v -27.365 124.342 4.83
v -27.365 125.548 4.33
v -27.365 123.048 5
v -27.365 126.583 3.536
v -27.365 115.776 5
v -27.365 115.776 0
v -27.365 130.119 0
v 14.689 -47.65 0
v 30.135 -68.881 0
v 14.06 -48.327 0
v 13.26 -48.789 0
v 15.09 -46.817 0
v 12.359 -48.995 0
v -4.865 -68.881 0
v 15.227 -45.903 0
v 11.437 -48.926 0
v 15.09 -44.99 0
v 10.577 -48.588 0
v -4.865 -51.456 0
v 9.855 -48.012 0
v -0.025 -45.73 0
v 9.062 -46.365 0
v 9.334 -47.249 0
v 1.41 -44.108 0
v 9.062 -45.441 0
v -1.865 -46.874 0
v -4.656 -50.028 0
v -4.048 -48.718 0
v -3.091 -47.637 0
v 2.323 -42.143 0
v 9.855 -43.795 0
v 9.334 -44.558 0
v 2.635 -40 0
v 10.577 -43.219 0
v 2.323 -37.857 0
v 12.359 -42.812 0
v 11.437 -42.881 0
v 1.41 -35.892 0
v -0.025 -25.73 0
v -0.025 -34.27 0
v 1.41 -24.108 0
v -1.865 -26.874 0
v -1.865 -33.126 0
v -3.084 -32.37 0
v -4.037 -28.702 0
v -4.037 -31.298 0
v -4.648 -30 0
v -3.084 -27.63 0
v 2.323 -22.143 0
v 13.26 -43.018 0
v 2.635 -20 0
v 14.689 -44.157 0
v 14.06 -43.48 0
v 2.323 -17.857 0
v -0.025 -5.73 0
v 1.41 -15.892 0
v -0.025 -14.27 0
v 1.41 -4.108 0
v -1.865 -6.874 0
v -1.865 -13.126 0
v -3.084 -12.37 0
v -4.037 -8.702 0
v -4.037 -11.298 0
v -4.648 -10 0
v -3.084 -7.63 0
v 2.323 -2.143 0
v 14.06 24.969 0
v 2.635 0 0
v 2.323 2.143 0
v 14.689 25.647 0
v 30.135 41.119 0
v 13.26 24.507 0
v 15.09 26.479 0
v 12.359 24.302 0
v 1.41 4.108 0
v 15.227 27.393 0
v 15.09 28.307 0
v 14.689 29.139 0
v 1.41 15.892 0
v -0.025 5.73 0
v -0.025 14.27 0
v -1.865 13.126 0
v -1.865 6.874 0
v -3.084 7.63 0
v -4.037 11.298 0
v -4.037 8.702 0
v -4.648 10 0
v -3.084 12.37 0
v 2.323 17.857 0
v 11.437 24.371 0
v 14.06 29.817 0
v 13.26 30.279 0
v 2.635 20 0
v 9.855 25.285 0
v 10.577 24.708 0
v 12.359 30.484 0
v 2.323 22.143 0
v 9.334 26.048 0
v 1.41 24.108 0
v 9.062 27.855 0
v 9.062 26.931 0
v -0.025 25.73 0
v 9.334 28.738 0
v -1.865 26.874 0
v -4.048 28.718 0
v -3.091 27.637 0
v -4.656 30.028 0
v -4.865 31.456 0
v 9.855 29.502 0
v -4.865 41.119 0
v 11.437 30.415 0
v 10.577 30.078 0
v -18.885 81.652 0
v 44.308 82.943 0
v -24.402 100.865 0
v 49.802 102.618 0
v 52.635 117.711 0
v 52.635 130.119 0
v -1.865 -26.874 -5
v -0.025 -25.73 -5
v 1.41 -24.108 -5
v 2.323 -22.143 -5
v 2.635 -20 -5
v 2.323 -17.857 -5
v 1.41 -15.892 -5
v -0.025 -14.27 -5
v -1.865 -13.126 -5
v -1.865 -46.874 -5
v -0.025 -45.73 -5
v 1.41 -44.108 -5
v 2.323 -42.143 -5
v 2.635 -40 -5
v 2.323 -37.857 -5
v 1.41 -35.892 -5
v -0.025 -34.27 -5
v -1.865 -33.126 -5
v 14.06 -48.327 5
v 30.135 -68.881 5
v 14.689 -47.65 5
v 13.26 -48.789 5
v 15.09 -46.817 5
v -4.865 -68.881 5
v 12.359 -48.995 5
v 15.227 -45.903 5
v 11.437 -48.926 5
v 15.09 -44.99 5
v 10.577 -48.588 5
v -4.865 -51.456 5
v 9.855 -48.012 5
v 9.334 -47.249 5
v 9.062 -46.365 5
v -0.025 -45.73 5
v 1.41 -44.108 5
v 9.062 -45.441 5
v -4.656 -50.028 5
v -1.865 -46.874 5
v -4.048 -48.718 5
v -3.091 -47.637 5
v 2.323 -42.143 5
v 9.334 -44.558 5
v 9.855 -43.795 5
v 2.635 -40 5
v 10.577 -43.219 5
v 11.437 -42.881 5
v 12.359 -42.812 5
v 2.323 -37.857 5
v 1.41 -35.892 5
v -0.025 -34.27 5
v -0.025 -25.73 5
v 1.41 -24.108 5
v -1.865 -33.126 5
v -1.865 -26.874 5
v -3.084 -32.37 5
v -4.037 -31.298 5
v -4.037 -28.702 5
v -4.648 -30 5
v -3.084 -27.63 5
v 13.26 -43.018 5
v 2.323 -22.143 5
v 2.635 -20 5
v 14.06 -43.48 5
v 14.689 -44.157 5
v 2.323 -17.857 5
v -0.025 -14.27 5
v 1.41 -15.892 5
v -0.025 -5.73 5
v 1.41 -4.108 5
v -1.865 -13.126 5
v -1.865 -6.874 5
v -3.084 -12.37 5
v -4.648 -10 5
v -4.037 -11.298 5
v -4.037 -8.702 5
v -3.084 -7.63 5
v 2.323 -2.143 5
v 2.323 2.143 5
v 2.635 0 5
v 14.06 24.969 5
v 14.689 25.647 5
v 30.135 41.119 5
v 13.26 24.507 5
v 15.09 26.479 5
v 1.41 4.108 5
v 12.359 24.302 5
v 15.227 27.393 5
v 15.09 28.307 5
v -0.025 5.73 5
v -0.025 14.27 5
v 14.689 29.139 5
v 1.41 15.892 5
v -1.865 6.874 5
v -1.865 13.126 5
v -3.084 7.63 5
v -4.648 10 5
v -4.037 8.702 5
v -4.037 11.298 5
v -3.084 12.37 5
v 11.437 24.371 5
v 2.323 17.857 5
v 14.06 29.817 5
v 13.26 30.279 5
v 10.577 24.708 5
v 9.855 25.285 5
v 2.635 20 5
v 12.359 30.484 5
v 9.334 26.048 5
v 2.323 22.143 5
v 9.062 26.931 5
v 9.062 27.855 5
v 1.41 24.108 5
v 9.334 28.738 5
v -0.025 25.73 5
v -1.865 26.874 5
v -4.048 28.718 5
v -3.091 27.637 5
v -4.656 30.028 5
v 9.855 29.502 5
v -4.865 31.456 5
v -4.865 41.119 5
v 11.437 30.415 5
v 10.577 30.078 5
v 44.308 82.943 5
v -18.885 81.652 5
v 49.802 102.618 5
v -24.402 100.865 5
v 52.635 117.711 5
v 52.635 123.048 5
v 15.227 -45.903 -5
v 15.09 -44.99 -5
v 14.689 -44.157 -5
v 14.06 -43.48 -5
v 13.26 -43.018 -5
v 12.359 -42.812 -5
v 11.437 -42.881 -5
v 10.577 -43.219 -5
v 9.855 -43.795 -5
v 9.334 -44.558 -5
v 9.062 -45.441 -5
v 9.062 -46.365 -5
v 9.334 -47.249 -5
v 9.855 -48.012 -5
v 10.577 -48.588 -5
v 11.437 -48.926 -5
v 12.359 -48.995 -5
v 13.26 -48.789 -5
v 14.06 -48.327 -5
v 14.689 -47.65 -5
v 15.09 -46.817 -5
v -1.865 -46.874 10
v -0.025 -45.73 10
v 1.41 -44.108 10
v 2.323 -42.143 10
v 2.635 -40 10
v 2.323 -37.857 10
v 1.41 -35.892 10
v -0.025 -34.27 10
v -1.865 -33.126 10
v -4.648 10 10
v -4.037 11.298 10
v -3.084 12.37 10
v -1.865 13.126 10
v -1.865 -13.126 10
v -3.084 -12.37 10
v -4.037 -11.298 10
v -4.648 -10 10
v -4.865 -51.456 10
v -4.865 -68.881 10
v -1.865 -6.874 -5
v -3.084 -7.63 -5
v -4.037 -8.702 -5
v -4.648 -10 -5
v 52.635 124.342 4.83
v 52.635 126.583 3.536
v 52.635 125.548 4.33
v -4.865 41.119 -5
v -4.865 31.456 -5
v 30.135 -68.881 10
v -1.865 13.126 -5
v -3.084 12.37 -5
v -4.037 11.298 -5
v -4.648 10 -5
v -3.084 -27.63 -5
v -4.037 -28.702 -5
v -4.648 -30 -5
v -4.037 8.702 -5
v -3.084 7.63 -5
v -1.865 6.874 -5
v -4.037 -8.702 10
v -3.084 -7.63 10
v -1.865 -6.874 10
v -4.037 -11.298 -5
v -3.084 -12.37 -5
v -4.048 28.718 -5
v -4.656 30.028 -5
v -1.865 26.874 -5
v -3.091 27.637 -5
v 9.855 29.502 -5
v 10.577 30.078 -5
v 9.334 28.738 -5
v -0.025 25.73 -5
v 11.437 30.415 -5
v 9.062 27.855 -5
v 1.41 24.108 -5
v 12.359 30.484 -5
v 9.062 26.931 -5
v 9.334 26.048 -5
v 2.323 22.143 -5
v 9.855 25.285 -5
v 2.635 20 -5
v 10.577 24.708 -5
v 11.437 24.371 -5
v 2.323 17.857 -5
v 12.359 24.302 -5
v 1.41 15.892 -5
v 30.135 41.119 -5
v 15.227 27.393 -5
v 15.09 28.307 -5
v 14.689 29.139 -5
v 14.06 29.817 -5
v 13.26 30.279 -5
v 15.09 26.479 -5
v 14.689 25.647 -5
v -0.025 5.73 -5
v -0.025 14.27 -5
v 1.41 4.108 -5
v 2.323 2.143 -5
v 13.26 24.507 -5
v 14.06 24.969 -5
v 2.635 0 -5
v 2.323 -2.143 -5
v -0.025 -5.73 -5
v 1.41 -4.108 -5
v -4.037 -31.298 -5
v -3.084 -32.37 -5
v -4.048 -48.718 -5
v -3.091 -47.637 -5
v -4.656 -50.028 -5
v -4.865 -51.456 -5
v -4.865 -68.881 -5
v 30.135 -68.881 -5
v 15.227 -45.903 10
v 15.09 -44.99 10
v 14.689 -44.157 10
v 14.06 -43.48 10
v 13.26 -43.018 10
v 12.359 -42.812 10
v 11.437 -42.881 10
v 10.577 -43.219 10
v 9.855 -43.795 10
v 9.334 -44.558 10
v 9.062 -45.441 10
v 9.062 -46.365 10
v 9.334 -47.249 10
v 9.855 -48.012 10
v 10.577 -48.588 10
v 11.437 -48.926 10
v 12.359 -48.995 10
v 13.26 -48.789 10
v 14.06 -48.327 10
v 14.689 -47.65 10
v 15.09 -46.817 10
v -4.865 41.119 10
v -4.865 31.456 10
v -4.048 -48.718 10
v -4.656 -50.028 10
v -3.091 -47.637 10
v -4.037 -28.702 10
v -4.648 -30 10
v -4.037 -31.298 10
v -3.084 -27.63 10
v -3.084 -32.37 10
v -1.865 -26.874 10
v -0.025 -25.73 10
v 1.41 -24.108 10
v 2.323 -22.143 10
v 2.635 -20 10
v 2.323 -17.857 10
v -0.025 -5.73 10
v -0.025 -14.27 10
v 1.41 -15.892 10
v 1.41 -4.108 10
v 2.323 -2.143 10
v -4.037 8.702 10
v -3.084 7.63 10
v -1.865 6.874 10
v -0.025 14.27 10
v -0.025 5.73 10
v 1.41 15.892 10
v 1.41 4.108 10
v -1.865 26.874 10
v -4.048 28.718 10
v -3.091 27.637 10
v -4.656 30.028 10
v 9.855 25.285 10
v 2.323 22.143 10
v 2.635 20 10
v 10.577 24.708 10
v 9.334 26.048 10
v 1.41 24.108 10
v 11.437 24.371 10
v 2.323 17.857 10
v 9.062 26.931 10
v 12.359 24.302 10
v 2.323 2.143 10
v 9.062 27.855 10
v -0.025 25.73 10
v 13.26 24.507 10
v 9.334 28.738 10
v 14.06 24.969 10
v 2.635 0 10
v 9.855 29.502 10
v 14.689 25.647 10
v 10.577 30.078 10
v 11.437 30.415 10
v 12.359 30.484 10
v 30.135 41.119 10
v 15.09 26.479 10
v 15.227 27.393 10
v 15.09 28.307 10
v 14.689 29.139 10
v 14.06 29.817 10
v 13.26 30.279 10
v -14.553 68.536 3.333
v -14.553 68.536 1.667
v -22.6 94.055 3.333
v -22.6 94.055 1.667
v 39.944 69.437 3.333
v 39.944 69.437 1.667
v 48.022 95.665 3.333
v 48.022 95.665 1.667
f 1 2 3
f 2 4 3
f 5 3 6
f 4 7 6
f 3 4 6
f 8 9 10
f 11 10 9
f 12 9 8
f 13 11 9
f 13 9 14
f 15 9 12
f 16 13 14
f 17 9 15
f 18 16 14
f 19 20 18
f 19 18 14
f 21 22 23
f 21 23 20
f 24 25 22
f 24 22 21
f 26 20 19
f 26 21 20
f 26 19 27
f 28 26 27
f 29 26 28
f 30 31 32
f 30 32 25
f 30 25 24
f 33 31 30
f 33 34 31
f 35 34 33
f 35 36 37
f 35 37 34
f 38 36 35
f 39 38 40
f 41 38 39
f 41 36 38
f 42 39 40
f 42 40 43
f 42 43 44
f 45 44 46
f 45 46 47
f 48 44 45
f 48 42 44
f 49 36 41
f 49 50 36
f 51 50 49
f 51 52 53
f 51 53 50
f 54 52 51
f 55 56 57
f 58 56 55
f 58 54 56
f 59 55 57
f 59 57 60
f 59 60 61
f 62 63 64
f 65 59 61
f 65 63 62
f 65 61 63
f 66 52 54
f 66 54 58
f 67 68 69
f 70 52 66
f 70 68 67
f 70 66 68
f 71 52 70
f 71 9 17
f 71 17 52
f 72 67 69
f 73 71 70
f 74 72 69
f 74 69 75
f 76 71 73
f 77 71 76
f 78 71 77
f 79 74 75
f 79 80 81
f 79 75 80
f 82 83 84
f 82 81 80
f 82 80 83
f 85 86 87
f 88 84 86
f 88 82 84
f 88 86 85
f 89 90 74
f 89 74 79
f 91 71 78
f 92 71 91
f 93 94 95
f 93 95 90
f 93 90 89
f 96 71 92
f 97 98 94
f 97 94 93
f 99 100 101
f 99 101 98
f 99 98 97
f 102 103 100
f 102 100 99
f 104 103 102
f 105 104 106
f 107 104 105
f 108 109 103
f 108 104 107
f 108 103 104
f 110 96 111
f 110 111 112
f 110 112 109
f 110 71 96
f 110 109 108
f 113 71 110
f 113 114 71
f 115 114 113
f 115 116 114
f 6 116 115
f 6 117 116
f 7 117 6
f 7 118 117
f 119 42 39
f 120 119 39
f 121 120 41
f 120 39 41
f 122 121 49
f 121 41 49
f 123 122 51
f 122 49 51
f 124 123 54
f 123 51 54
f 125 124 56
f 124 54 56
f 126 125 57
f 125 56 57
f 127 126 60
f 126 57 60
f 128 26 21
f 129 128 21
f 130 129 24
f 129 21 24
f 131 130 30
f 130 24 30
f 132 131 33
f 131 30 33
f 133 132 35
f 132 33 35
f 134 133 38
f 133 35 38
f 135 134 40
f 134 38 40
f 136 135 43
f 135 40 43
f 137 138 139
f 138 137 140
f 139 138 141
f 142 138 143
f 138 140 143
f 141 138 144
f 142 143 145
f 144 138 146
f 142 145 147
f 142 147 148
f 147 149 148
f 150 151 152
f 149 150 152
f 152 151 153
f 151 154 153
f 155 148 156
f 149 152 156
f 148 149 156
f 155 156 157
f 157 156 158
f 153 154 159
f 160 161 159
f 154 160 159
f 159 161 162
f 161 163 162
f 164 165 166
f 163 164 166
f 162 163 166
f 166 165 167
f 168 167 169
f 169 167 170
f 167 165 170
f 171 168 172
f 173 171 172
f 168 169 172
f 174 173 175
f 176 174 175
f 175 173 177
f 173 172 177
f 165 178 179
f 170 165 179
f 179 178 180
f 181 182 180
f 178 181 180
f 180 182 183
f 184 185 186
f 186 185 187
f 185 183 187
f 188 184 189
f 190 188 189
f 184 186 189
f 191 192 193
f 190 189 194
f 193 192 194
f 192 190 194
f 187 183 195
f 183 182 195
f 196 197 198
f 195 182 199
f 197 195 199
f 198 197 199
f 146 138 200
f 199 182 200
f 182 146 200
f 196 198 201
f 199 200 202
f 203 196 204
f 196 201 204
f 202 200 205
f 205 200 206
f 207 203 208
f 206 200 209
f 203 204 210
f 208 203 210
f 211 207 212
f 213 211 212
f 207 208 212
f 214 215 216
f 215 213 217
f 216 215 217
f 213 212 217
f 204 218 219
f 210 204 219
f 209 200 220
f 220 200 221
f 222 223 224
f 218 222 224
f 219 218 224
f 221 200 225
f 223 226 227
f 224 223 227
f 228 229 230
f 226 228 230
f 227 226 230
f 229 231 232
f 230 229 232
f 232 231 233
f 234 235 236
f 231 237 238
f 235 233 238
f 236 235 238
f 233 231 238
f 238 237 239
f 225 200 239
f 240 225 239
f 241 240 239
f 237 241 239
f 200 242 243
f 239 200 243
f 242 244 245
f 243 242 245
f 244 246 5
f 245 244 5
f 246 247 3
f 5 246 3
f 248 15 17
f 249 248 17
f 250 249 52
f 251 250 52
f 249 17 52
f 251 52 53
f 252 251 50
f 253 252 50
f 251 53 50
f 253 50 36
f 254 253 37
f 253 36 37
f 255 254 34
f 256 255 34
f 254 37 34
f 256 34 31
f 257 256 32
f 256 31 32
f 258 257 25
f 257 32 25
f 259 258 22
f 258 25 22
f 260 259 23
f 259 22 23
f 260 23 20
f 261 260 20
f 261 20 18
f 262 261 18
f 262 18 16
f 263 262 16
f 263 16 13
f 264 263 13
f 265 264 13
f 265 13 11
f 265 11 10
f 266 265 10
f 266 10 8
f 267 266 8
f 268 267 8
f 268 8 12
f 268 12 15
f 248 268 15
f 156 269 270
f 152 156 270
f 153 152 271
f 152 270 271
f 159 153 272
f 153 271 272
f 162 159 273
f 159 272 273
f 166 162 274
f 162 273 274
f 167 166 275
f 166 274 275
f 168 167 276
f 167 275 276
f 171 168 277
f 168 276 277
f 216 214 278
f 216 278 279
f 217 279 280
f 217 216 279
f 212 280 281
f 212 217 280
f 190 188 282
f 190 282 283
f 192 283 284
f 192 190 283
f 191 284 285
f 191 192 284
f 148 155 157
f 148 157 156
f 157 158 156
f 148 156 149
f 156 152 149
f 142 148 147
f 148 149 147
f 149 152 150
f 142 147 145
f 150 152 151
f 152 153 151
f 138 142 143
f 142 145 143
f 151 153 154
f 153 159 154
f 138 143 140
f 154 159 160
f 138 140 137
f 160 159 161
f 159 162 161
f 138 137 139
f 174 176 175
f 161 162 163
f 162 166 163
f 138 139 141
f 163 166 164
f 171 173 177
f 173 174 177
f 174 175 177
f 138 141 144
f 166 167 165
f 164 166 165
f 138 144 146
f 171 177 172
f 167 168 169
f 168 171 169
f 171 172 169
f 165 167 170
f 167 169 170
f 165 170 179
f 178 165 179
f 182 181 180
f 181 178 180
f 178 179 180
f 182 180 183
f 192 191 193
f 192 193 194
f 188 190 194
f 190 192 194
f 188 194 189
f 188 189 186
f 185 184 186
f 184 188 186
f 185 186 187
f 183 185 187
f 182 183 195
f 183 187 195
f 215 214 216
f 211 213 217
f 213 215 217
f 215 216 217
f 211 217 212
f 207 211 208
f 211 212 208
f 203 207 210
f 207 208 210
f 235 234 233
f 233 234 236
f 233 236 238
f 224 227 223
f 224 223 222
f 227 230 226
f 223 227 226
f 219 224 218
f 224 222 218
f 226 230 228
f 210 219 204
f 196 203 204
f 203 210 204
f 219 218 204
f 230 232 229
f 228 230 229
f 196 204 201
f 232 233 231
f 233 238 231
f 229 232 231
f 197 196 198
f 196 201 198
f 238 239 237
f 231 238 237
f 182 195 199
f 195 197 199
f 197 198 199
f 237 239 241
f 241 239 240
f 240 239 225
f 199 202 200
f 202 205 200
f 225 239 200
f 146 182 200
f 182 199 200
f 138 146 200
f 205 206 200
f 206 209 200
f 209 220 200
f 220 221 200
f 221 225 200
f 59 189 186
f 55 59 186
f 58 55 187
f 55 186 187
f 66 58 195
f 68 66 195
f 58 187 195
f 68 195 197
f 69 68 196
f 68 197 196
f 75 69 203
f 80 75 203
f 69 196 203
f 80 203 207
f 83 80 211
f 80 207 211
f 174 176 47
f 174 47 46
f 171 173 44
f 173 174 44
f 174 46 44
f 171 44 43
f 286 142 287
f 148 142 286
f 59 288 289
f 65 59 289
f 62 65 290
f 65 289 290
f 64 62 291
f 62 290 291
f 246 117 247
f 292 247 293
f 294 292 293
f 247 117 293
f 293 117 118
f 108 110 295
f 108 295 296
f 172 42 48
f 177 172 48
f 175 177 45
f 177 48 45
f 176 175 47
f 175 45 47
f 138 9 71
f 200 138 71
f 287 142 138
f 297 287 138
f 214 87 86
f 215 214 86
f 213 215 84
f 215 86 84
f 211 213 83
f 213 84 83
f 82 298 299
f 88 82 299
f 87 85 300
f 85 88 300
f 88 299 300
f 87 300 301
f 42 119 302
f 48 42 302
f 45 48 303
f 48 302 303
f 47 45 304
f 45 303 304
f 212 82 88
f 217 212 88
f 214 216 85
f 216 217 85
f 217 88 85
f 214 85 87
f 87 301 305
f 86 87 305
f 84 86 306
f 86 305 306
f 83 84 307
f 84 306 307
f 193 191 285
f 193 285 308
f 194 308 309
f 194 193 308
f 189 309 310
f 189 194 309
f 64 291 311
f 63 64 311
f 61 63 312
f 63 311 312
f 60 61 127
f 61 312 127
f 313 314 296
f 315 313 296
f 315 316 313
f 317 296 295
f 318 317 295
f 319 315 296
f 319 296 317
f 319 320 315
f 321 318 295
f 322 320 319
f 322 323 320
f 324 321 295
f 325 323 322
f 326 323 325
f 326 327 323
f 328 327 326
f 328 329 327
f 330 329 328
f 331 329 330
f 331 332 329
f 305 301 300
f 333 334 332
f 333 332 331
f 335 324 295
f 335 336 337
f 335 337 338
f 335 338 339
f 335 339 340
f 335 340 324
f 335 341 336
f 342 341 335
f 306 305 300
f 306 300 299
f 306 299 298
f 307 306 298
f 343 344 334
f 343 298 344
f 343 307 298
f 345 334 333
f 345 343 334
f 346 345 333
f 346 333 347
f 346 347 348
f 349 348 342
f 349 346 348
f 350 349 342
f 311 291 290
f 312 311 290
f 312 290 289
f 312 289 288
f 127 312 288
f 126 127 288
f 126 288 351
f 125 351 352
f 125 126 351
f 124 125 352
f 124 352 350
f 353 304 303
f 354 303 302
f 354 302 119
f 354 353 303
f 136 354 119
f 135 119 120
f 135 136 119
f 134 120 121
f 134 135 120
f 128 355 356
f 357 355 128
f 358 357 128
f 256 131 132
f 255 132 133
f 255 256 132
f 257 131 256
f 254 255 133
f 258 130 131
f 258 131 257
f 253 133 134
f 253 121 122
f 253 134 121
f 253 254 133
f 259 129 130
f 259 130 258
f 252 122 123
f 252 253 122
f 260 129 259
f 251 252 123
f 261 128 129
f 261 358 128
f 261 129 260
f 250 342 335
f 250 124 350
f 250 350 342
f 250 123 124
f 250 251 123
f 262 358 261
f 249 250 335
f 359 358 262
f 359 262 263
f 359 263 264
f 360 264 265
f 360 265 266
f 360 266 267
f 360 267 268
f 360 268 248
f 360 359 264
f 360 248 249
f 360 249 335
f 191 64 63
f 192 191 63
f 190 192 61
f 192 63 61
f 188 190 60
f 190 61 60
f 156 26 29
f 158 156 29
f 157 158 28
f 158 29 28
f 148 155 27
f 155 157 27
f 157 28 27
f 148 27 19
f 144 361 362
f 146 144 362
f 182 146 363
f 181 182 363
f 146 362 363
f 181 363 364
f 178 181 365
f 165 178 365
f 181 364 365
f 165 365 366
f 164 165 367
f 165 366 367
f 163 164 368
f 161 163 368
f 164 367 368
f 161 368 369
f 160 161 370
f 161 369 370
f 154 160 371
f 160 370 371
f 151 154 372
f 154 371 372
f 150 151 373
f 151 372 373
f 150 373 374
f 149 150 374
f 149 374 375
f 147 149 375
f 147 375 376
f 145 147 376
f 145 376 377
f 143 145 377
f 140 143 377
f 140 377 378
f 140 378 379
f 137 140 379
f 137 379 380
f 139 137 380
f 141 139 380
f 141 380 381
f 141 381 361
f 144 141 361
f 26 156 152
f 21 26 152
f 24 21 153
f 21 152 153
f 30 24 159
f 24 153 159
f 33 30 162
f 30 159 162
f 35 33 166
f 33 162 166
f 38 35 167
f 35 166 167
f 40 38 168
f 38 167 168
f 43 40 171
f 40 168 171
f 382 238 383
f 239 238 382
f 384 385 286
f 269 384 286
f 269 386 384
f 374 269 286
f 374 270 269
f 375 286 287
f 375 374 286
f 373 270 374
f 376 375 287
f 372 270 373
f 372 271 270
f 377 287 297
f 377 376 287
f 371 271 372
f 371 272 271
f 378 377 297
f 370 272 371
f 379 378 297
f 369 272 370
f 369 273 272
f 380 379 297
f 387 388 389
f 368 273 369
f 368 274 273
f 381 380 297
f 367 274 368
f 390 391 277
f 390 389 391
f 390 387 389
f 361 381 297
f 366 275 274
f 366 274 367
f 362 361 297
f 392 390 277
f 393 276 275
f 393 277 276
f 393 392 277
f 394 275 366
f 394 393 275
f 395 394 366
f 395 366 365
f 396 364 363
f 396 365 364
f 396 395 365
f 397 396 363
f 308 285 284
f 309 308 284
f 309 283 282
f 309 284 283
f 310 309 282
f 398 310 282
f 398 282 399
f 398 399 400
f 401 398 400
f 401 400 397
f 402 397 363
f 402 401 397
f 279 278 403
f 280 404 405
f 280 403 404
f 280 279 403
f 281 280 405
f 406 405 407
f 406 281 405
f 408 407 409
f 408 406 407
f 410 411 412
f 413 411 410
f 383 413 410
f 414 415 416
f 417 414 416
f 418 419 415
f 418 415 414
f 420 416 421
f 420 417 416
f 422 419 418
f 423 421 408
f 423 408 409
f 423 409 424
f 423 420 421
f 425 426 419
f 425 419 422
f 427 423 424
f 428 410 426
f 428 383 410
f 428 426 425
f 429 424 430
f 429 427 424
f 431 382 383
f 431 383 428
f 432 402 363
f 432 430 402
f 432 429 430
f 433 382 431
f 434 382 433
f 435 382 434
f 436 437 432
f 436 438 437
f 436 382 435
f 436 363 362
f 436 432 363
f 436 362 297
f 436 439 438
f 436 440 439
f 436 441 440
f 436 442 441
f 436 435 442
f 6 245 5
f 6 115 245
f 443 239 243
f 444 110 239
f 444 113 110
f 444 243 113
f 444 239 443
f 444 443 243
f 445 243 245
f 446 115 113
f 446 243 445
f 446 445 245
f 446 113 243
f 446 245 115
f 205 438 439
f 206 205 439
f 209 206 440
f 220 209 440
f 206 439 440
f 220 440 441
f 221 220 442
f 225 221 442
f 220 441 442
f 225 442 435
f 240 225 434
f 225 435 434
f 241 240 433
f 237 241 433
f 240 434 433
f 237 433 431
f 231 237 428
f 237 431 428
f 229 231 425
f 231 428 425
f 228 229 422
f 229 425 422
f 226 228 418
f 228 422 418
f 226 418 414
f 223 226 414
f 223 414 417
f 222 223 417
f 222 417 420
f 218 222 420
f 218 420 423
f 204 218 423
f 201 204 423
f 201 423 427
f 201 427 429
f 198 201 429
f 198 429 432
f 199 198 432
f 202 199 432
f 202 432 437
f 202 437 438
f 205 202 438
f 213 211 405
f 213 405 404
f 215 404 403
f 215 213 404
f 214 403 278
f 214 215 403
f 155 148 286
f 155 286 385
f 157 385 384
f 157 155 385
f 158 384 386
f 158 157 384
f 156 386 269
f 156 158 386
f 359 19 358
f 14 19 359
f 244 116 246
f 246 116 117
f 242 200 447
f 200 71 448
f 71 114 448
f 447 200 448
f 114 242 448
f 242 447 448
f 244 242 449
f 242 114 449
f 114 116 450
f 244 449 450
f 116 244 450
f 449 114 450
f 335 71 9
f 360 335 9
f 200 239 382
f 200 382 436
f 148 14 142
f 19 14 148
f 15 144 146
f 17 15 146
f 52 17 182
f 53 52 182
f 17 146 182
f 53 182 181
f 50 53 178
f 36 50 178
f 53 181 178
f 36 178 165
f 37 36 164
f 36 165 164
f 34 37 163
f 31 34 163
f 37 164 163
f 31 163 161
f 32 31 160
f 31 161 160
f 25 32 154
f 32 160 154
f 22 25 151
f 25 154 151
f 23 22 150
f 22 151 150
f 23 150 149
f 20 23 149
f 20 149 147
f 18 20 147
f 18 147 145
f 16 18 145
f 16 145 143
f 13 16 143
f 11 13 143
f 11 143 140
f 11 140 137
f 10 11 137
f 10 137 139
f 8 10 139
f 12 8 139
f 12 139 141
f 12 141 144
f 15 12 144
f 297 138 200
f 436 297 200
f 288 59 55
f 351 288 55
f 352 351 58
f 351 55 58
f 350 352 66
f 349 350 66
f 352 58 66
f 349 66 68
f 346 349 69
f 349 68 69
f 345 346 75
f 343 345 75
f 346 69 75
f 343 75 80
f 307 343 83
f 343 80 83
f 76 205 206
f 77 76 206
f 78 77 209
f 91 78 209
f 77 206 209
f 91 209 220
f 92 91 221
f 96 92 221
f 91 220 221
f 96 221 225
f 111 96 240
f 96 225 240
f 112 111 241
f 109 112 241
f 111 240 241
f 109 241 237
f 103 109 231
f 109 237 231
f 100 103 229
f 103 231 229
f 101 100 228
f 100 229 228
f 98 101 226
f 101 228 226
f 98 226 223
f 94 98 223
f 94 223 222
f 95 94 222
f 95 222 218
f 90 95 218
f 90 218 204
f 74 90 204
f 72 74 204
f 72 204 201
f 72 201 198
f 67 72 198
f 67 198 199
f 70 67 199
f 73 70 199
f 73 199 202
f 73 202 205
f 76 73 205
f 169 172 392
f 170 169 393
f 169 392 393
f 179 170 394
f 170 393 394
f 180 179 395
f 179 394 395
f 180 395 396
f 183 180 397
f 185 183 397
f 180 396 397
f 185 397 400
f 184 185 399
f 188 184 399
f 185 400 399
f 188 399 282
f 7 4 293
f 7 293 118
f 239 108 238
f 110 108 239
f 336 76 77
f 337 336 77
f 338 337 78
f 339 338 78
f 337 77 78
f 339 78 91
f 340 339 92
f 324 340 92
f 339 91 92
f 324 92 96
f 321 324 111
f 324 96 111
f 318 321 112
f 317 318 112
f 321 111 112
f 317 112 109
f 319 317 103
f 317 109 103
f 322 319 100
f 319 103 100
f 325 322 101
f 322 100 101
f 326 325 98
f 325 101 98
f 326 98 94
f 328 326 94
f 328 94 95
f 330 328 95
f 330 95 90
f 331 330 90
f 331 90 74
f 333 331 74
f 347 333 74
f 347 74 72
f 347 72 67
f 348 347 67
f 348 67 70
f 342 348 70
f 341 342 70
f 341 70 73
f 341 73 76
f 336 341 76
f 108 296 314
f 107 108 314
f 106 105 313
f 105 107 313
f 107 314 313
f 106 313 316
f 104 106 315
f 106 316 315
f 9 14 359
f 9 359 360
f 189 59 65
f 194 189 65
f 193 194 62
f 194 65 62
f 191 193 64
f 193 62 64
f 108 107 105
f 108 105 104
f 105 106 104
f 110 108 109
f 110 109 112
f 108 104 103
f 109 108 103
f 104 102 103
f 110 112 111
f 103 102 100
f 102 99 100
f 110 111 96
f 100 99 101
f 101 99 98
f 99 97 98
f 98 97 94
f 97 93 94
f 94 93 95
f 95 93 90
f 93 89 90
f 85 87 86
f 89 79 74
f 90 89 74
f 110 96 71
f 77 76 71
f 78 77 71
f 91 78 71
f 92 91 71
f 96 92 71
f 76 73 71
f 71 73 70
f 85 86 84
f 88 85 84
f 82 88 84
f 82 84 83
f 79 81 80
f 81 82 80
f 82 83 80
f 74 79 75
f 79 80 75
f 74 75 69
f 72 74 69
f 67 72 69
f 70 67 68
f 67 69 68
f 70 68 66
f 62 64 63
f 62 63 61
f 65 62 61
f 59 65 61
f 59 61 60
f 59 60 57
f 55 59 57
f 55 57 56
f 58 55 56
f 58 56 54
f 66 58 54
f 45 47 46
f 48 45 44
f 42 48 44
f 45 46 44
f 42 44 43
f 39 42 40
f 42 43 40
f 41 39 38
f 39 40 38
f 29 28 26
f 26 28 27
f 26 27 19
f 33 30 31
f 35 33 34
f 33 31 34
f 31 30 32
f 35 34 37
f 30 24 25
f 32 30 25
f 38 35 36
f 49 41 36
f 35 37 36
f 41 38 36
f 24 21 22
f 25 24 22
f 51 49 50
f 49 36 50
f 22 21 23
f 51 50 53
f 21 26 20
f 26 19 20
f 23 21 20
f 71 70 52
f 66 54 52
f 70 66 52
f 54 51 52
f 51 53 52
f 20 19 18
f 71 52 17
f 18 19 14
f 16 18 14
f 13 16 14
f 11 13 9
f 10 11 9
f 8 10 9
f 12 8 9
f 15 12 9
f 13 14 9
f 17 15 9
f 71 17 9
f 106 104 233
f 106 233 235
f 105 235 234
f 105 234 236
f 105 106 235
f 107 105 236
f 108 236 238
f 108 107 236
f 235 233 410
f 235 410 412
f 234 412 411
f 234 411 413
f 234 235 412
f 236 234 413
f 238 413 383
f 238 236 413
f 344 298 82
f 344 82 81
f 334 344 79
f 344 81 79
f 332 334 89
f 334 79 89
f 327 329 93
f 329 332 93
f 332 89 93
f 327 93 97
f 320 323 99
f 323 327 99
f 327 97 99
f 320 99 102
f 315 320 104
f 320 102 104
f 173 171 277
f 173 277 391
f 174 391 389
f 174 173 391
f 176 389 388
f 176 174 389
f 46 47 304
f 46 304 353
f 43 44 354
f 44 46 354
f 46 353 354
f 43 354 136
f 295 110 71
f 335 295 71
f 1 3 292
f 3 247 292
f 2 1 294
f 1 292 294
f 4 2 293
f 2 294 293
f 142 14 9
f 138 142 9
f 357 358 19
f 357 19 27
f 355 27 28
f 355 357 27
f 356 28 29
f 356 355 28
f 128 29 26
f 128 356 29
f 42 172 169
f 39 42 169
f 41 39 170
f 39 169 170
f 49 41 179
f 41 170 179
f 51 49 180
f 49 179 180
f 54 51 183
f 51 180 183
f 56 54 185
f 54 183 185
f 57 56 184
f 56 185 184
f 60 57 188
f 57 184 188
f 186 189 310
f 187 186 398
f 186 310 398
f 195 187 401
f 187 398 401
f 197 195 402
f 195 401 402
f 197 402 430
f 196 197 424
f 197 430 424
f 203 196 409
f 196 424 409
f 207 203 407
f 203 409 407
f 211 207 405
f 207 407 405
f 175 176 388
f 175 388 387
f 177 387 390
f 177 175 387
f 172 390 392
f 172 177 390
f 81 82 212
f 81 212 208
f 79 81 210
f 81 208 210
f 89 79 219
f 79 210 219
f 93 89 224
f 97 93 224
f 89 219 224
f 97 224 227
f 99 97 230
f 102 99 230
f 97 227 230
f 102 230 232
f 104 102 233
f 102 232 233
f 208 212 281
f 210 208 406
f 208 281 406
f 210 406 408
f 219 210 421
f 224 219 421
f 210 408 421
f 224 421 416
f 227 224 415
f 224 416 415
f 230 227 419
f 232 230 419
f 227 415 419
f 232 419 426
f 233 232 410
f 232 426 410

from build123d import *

# Parameters (mm, degrees)
F0_W          = 35
F0_H          = 90
F0_H_2        = 110
F1_DEPTH      = 5
F2_W          = 35
F2_H          = 110
F4_DEPTH      = 5
F3_W          = 35
F3_H          = 110
F5_DEPTH      = 5
F7_DEPTH      = 25
F6_R          = 7.5
F8_DEPTH      = 25
F9_T1_DEPTH   = 24.7821961869
F9_2_T1_DEPTH = 24.7821961869
F9_3_T1_DEPTH = 24.7821961869
F10_R         = 3.1
F11_DEPTH     = 25
F12_DEPTH     = 25
F13_T1_DEPTH  = 110.8601958556
F14_R         = 5


# Not quite as in the source:
# - a fillet or chamfer that OpenCascade refuses, or shapes differently, is made with other operations: its cross-section is extruded or revolved along the edge and cut away or added


with BuildPart() as f1:
    # F0 (on Top) → F1 (new body)
    with BuildSketch(Plane.XY):
        with BuildLine():
            add(Edge.make_bspline(
                [(-4.864667505, 41.1189725995), (-14.8268111493, 68.8529683822), (-24.7889547935, 96.5869641649), (-27.364667505, 115.7758631074)],
                knots=[0, 0, 0, 0, 0.5211248606, 0.5211248606, 0.5211248606, 0.5211248606], degree=3))
            Line((-4.864667505, 41.1189725995), (-4.864667505, 131.1189725995))
            Line((-4.864667505, 131.1189725995), (-27.364667505, 131.1189725995))
            Line((-27.364667505, 131.1189725995), (-27.364667505, 115.7758631074))
        make_face()
        with Locations((12.635332495, 86.1189725995)):
            Rectangle(F0_W, F0_H)
        with BuildLine():
            Line((30.135332495, 131.1189725995), (30.135332495, 41.1189725995))
            add(Edge.make_bspline(
                [(30.135332495, 41.1189725995), (40.232951817, 69.7853589458), (50.330571139, 98.4517452921), (52.635332495, 117.7113411352)],
                knots=[0, 0, 0, 0, 0.5432365903, 0.5432365903, 0.5432365903, 0.5432365903], degree=3))
            Line((52.635332495, 117.7113411352), (52.635332495, 131.1189725995))
            Line((52.635332495, 131.1189725995), (30.135332495, 131.1189725995))
        make_face()
        with Locations((12.635332495, -13.8810274005)):
            Rectangle(F0_W, F0_H_2)
    extrude(amount=F1_DEPTH)


with BuildPart() as f4:
    # F2 (on face) → F4 (new body)
    with BuildSketch(Plane.XY.offset(5)):
        with Locations((12.635332495, -13.8810274005)):
            Rectangle(F2_W, F2_H)
    extrude(amount=F4_DEPTH)


with BuildPart() as f5:
    # F3 (on face) → F5 (new body)
    with BuildSketch(Plane(origin=(0, 0, 0), x_dir=(1, 0, 0), z_dir=(0, 0, -1))):
        with Locations((12.635332495, 13.8810274005)):
            Rectangle(F3_W, F3_H)
    extrude(amount=F5_DEPTH)


with BuildPart() as f7_tool:
    # F6 (on face) → F7 (new body)
    with BuildSketch(Plane.XY.offset(10)):
        with BuildLine():
            ThreePointArc((-4.864667505, 12.5), (0.4386333539, 14.6966991411), (2.635332495, 20))
            ThreePointArc((2.635332495, 20), (0.4386333539, 25.3033008589), (-4.864667505, 27.5))
            Line((-4.864667505, 27.5), (-4.864667505, 12.5))
        make_face()
    extrude(amount=-F7_DEPTH)


with BuildPart() as f1_1:
    add(f1.part)

    # F7: cut by f7_tool
    add(f7_tool.part, mode=Mode.SUBTRACT)


with BuildPart() as f4_1:
    add(f4.part)

    # F7: cut by f7_tool
    add(f7_tool.part, mode=Mode.SUBTRACT)


with BuildPart() as f5_1:
    add(f5.part)

    # F7: cut by f7_tool
    add(f7_tool.part, mode=Mode.SUBTRACT)


with BuildPart() as f8_tool:
    # F6 (on face) → F8 (new body)
    with BuildSketch(Plane.XY.offset(10)):
        with Locations((-4.864667505, 20)):
            Circle(F6_R)
        with Locations((-4.864667505, 0)):
            Circle(F6_R)
        with Locations((-4.864667505, -20)):
            Circle(F6_R)
        with Locations((-4.864667505, -40)):
            Circle(F6_R)
    extrude(amount=-F8_DEPTH)


with BuildPart() as f1_2:
    add(f1_1.part)

    # F8: cut by f8_tool
    add(f8_tool.part, mode=Mode.SUBTRACT)

    # F9: fillet of radius 5 on 8 edges, made by hand

    # F9_s2 → F9_t1 (cut)
    with BuildSketch(Plane.XY.offset(-9.8910980935)):
        with BuildLine():
            ThreePointArc((-1.864667505, 26.8738635424), (-4.0479676377, 28.7178264499), (-4.864667505, 31.4564392374))
            Line((-4.864667505, 31.4564392374), (-4.864667505, 27.5))
            ThreePointArc((-4.864667505, 27.5), (-3.3323451774, 27.341797347), (-1.864667505, 26.8738635424))
        make_face()
        with BuildLine():
            ThreePointArc((-1.864667505, 13.1261364576), (-4.0479676377, 11.2821735501), (-4.864667505, 8.5435607626))
            Line((-4.864667505, 8.5435607626), (-4.864667505, 12.5))
            ThreePointArc((-4.864667505, 12.5), (-3.3323451774, 12.658202653), (-1.864667505, 13.1261364576))
        make_face()
        with BuildLine():
            ThreePointArc((-4.864667505, 11.4564392374), (-4.0479676377, 8.7178264499), (-1.864667505, 6.8738635424))
            ThreePointArc((-1.864667505, 6.8738635424), (-3.3323451774, 7.341797347), (-4.864667505, 7.5))
            Line((-4.864667505, 7.5), (-4.864667505, 11.4564392374))
        make_face()
        with BuildLine():
            ThreePointArc((-1.864667505, -6.8738635424), (-4.0479676377, -8.7178264499), (-4.864667505, -11.4564392374))
            Line((-4.864667505, -11.4564392374), (-4.864667505, -7.5))
            ThreePointArc((-4.864667505, -7.5), (-3.3323451774, -7.341797347), (-1.864667505, -6.8738635424))
        make_face()
        with BuildLine():
            ThreePointArc((-4.864667505, -8.5435607626), (-4.0479676377, -11.2821735501), (-1.864667505, -13.1261364576))
            ThreePointArc((-1.864667505, -13.1261364576), (-3.3323451774, -12.658202653), (-4.864667505, -12.5))
            Line((-4.864667505, -12.5), (-4.864667505, -8.5435607626))
        make_face()
        with BuildLine():
            ThreePointArc((-1.864667505, -26.8738635424), (-4.0479676377, -28.7178264499), (-4.864667505, -31.4564392374))
            Line((-4.864667505, -31.4564392374), (-4.864667505, -27.5))
            ThreePointArc((-4.864667505, -27.5), (-3.3323451774, -27.341797347), (-1.864667505, -26.8738635424))
        make_face()
        with BuildLine():
            ThreePointArc((-4.864667505, -28.5435607626), (-4.0479676377, -31.2821735501), (-1.864667505, -33.1261364576))
            ThreePointArc((-1.864667505, -33.1261364576), (-3.3323451774, -32.658202653), (-4.864667505, -32.5))
            Line((-4.864667505, -32.5), (-4.864667505, -28.5435607626))
        make_face()
        with BuildLine():
            ThreePointArc((-1.864667505, -46.8738635424), (-4.0479676377, -48.7178264499), (-4.864667505, -51.4564392374))
            Line((-4.864667505, -51.4564392374), (-4.864667505, -47.5))
            ThreePointArc((-4.864667505, -47.5), (-3.3323451774, -47.341797347), (-1.864667505, -46.8738635424))
        make_face()
    extrude(amount=F9_T1_DEPTH, mode=Mode.SUBTRACT)


with BuildPart() as f4_2:
    add(f4_1.part)

    # F8: cut by f8_tool
    add(f8_tool.part, mode=Mode.SUBTRACT)

    # F9#2: fillet of radius 5 on 8 edges, made by hand

    # F9_2_s2 → F9_2_t1 (cut)
    with BuildSketch(Plane.XY.offset(-4.8910980935)):
        with BuildLine():
            ThreePointArc((-1.864667505, 26.8738635424), (-4.0479676377, 28.7178264499), (-4.864667505, 31.4564392374))
            Line((-4.864667505, 31.4564392374), (-4.864667505, 27.5))
            ThreePointArc((-4.864667505, 27.5), (-3.3323451774, 27.341797347), (-1.864667505, 26.8738635424))
        make_face()
        with BuildLine():
            ThreePointArc((-4.864667505, 8.5435607626), (-4.0479676377, 11.2821735501), (-1.864667505, 13.1261364576))
            ThreePointArc((-1.864667505, 13.1261364576), (-3.3323451774, 12.658202653), (-4.864667505, 12.5))
            Line((-4.864667505, 12.5), (-4.864667505, 8.5435607626))
        make_face()
        with BuildLine():
            ThreePointArc((-4.864667505, -11.4564392374), (-4.0479676377, -8.7178264499), (-1.864667505, -6.8738635424))
            ThreePointArc((-1.864667505, -6.8738635424), (-3.3323451774, -7.341797347), (-4.864667505, -7.5))
            Line((-4.864667505, -7.5), (-4.864667505, -11.4564392374))
        make_face()
        with BuildLine():
            ThreePointArc((-1.864667505, 6.8738635424), (-4.0479676377, 8.7178264499), (-4.864667505, 11.4564392374))
            Line((-4.864667505, 11.4564392374), (-4.864667505, 7.5))
            ThreePointArc((-4.864667505, 7.5), (-3.3323451774, 7.341797347), (-1.864667505, 6.8738635424))
        make_face()
        with BuildLine():
            ThreePointArc((-4.864667505, -31.4564392374), (-4.0479676377, -28.7178264499), (-1.864667505, -26.8738635424))
            ThreePointArc((-1.864667505, -26.8738635424), (-3.3323451774, -27.341797347), (-4.864667505, -27.5))
            Line((-4.864667505, -27.5), (-4.864667505, -31.4564392374))
        make_face()
        with BuildLine():
            ThreePointArc((-1.864667505, -13.1261364576), (-4.0479676377, -11.2821735501), (-4.864667505, -8.5435607626))
            Line((-4.864667505, -8.5435607626), (-4.864667505, -12.5))
            ThreePointArc((-4.864667505, -12.5), (-3.3323451774, -12.658202653), (-1.864667505, -13.1261364576))
        make_face()
        with BuildLine():
            ThreePointArc((-4.864667505, -51.4564392374), (-4.0479676377, -48.7178264499), (-1.864667505, -46.8738635424))
            ThreePointArc((-1.864667505, -46.8738635424), (-3.3323451774, -47.341797347), (-4.864667505, -47.5))
            Line((-4.864667505, -47.5), (-4.864667505, -51.4564392374))
        make_face()
        with BuildLine():
            ThreePointArc((-1.864667505, -33.1261364576), (-4.0479676377, -31.2821735501), (-4.864667505, -28.5435607626))
            Line((-4.864667505, -28.5435607626), (-4.864667505, -32.5))
            ThreePointArc((-4.864667505, -32.5), (-3.3323451774, -32.658202653), (-1.864667505, -33.1261364576))
        make_face()
    extrude(amount=F9_2_T1_DEPTH, mode=Mode.SUBTRACT)


with BuildPart() as f5_2:
    add(f5_1.part)

    # F8: cut by f8_tool
    add(f8_tool.part, mode=Mode.SUBTRACT)

    # F9#3: fillet of radius 5 on 8 edges, made by hand

    # F9_3_s2 → F9_3_t1 (cut)
    with BuildSketch(Plane.XY.offset(-14.8910980935)):
        with BuildLine():
            ThreePointArc((-4.864667505, 31.4564392374), (-4.0479676377, 28.7178264499), (-1.864667505, 26.8738635424))
            ThreePointArc((-1.864667505, 26.8738635424), (-3.3323451774, 27.341797347), (-4.864667505, 27.5))
            Line((-4.864667505, 27.5), (-4.864667505, 31.4564392374))
        make_face()
        with BuildLine():
            ThreePointArc((-1.864667505, 13.1261364576), (-4.0479676377, 11.2821735501), (-4.864667505, 8.5435607626))
            Line((-4.864667505, 8.5435607626), (-4.864667505, 12.5))
            ThreePointArc((-4.864667505, 12.5), (-3.3323451774, 12.658202653), (-1.864667505, 13.1261364576))
        make_face()
        with BuildLine():
            ThreePointArc((-4.864667505, 11.4564392374), (-4.0479676377, 8.7178264499), (-1.864667505, 6.8738635424))
            ThreePointArc((-1.864667505, 6.8738635424), (-3.3323451774, 7.341797347), (-4.864667505, 7.5))
            Line((-4.864667505, 7.5), (-4.864667505, 11.4564392374))
        make_face()
        with BuildLine():
            ThreePointArc((-1.864667505, -6.8738635424), (-4.0479676377, -8.7178264499), (-4.864667505, -11.4564392374))
            Line((-4.864667505, -11.4564392374), (-4.864667505, -7.5))
            ThreePointArc((-4.864667505, -7.5), (-3.3323451774, -7.341797347), (-1.864667505, -6.8738635424))
        make_face()
        with BuildLine():
            ThreePointArc((-4.864667505, -8.5435607626), (-4.0479676377, -11.2821735501), (-1.864667505, -13.1261364576))
            ThreePointArc((-1.864667505, -13.1261364576), (-3.3323451774, -12.658202653), (-4.864667505, -12.5))
            Line((-4.864667505, -12.5), (-4.864667505, -8.5435607626))
        make_face()
        with BuildLine():
            ThreePointArc((-1.864667505, -26.8738635424), (-4.0479676377, -28.7178264499), (-4.864667505, -31.4564392374))
            Line((-4.864667505, -31.4564392374), (-4.864667505, -27.5))
            ThreePointArc((-4.864667505, -27.5), (-3.3323451774, -27.341797347), (-1.864667505, -26.8738635424))
        make_face()
        with BuildLine():
            ThreePointArc((-4.864667505, -51.4564392374), (-4.0479676377, -48.7178264499), (-1.864667505, -46.8738635424))
            ThreePointArc((-1.864667505, -46.8738635424), (-3.3323451774, -47.341797347), (-4.864667505, -47.5))
            Line((-4.864667505, -47.5), (-4.864667505, -51.4564392374))
        make_face()
        with BuildLine():
            ThreePointArc((-4.864667505, -28.5435607626), (-4.0479676377, -31.2821735501), (-1.864667505, -33.1261364576))
            ThreePointArc((-1.864667505, -33.1261364576), (-3.3323451774, -32.658202653), (-4.864667505, -32.5))
            Line((-4.864667505, -32.5), (-4.864667505, -28.5435607626))
        make_face()
    extrude(amount=F9_3_T1_DEPTH, mode=Mode.SUBTRACT)


with BuildPart() as f11_tool:
    # F10 (on face) → F11 (new body)
    with BuildSketch(Plane.XY.offset(10)):
        with Locations((12.1272588149, 27.3931510746)):
            Circle(F10_R)
    extrude(amount=-F11_DEPTH)


with BuildPart() as f1_3:
    add(f1_2.part)

    # F11: cut by f11_tool
    add(f11_tool.part, mode=Mode.SUBTRACT)


with BuildPart() as f4_3:
    add(f4_2.part)

    # F11: cut by f11_tool
    add(f11_tool.part, mode=Mode.SUBTRACT)


with BuildPart() as f5_3:
    add(f5_2.part)

    # F11: cut by f11_tool
    add(f11_tool.part, mode=Mode.SUBTRACT)


with BuildPart() as f12_tool:
    # F10 (on face) → F12 (new body)
    with BuildSketch(Plane.XY.offset(10)):
        with Locations((12.1272588149, 27.3931510746)):
            Circle(F10_R)
        with Locations((12.1272588149, -45.9034666419)):
            Circle(F10_R)
    extrude(amount=-F12_DEPTH)


with BuildPart() as f1_4:
    add(f1_3.part)

    # F12: cut by f12_tool
    add(f12_tool.part, mode=Mode.SUBTRACT)

    # F13: chamfer of 6 on 1 edges, made by hand

    # F13_s2 → F13_t1 (cut)
    with BuildSketch(Plane.YZ.offset(-42.7947654328)):
        Polygon((125.1189725995, 5), (131.1189725995, -1), (131.1189725995, 5), align=None)
    extrude(amount=F13_T1_DEPTH, mode=Mode.SUBTRACT)

    # F14
    f14_edges = [f1_4.edges().sort_by_distance(p)[0] for p in [
        (12.635332, 125.118973, 5),
    ]]
    fillet(f14_edges, radius=F14_R)


with BuildPart() as f4_4:
    add(f4_3.part)

    # F12: cut by f12_tool
    add(f12_tool.part, mode=Mode.SUBTRACT)


with BuildPart() as f5_4:
    add(f5_3.part)

    # F12: cut by f12_tool
    add(f12_tool.part, mode=Mode.SUBTRACT)


solid = Compound([f1_4.part, f4_4.part, f5_4.part])
